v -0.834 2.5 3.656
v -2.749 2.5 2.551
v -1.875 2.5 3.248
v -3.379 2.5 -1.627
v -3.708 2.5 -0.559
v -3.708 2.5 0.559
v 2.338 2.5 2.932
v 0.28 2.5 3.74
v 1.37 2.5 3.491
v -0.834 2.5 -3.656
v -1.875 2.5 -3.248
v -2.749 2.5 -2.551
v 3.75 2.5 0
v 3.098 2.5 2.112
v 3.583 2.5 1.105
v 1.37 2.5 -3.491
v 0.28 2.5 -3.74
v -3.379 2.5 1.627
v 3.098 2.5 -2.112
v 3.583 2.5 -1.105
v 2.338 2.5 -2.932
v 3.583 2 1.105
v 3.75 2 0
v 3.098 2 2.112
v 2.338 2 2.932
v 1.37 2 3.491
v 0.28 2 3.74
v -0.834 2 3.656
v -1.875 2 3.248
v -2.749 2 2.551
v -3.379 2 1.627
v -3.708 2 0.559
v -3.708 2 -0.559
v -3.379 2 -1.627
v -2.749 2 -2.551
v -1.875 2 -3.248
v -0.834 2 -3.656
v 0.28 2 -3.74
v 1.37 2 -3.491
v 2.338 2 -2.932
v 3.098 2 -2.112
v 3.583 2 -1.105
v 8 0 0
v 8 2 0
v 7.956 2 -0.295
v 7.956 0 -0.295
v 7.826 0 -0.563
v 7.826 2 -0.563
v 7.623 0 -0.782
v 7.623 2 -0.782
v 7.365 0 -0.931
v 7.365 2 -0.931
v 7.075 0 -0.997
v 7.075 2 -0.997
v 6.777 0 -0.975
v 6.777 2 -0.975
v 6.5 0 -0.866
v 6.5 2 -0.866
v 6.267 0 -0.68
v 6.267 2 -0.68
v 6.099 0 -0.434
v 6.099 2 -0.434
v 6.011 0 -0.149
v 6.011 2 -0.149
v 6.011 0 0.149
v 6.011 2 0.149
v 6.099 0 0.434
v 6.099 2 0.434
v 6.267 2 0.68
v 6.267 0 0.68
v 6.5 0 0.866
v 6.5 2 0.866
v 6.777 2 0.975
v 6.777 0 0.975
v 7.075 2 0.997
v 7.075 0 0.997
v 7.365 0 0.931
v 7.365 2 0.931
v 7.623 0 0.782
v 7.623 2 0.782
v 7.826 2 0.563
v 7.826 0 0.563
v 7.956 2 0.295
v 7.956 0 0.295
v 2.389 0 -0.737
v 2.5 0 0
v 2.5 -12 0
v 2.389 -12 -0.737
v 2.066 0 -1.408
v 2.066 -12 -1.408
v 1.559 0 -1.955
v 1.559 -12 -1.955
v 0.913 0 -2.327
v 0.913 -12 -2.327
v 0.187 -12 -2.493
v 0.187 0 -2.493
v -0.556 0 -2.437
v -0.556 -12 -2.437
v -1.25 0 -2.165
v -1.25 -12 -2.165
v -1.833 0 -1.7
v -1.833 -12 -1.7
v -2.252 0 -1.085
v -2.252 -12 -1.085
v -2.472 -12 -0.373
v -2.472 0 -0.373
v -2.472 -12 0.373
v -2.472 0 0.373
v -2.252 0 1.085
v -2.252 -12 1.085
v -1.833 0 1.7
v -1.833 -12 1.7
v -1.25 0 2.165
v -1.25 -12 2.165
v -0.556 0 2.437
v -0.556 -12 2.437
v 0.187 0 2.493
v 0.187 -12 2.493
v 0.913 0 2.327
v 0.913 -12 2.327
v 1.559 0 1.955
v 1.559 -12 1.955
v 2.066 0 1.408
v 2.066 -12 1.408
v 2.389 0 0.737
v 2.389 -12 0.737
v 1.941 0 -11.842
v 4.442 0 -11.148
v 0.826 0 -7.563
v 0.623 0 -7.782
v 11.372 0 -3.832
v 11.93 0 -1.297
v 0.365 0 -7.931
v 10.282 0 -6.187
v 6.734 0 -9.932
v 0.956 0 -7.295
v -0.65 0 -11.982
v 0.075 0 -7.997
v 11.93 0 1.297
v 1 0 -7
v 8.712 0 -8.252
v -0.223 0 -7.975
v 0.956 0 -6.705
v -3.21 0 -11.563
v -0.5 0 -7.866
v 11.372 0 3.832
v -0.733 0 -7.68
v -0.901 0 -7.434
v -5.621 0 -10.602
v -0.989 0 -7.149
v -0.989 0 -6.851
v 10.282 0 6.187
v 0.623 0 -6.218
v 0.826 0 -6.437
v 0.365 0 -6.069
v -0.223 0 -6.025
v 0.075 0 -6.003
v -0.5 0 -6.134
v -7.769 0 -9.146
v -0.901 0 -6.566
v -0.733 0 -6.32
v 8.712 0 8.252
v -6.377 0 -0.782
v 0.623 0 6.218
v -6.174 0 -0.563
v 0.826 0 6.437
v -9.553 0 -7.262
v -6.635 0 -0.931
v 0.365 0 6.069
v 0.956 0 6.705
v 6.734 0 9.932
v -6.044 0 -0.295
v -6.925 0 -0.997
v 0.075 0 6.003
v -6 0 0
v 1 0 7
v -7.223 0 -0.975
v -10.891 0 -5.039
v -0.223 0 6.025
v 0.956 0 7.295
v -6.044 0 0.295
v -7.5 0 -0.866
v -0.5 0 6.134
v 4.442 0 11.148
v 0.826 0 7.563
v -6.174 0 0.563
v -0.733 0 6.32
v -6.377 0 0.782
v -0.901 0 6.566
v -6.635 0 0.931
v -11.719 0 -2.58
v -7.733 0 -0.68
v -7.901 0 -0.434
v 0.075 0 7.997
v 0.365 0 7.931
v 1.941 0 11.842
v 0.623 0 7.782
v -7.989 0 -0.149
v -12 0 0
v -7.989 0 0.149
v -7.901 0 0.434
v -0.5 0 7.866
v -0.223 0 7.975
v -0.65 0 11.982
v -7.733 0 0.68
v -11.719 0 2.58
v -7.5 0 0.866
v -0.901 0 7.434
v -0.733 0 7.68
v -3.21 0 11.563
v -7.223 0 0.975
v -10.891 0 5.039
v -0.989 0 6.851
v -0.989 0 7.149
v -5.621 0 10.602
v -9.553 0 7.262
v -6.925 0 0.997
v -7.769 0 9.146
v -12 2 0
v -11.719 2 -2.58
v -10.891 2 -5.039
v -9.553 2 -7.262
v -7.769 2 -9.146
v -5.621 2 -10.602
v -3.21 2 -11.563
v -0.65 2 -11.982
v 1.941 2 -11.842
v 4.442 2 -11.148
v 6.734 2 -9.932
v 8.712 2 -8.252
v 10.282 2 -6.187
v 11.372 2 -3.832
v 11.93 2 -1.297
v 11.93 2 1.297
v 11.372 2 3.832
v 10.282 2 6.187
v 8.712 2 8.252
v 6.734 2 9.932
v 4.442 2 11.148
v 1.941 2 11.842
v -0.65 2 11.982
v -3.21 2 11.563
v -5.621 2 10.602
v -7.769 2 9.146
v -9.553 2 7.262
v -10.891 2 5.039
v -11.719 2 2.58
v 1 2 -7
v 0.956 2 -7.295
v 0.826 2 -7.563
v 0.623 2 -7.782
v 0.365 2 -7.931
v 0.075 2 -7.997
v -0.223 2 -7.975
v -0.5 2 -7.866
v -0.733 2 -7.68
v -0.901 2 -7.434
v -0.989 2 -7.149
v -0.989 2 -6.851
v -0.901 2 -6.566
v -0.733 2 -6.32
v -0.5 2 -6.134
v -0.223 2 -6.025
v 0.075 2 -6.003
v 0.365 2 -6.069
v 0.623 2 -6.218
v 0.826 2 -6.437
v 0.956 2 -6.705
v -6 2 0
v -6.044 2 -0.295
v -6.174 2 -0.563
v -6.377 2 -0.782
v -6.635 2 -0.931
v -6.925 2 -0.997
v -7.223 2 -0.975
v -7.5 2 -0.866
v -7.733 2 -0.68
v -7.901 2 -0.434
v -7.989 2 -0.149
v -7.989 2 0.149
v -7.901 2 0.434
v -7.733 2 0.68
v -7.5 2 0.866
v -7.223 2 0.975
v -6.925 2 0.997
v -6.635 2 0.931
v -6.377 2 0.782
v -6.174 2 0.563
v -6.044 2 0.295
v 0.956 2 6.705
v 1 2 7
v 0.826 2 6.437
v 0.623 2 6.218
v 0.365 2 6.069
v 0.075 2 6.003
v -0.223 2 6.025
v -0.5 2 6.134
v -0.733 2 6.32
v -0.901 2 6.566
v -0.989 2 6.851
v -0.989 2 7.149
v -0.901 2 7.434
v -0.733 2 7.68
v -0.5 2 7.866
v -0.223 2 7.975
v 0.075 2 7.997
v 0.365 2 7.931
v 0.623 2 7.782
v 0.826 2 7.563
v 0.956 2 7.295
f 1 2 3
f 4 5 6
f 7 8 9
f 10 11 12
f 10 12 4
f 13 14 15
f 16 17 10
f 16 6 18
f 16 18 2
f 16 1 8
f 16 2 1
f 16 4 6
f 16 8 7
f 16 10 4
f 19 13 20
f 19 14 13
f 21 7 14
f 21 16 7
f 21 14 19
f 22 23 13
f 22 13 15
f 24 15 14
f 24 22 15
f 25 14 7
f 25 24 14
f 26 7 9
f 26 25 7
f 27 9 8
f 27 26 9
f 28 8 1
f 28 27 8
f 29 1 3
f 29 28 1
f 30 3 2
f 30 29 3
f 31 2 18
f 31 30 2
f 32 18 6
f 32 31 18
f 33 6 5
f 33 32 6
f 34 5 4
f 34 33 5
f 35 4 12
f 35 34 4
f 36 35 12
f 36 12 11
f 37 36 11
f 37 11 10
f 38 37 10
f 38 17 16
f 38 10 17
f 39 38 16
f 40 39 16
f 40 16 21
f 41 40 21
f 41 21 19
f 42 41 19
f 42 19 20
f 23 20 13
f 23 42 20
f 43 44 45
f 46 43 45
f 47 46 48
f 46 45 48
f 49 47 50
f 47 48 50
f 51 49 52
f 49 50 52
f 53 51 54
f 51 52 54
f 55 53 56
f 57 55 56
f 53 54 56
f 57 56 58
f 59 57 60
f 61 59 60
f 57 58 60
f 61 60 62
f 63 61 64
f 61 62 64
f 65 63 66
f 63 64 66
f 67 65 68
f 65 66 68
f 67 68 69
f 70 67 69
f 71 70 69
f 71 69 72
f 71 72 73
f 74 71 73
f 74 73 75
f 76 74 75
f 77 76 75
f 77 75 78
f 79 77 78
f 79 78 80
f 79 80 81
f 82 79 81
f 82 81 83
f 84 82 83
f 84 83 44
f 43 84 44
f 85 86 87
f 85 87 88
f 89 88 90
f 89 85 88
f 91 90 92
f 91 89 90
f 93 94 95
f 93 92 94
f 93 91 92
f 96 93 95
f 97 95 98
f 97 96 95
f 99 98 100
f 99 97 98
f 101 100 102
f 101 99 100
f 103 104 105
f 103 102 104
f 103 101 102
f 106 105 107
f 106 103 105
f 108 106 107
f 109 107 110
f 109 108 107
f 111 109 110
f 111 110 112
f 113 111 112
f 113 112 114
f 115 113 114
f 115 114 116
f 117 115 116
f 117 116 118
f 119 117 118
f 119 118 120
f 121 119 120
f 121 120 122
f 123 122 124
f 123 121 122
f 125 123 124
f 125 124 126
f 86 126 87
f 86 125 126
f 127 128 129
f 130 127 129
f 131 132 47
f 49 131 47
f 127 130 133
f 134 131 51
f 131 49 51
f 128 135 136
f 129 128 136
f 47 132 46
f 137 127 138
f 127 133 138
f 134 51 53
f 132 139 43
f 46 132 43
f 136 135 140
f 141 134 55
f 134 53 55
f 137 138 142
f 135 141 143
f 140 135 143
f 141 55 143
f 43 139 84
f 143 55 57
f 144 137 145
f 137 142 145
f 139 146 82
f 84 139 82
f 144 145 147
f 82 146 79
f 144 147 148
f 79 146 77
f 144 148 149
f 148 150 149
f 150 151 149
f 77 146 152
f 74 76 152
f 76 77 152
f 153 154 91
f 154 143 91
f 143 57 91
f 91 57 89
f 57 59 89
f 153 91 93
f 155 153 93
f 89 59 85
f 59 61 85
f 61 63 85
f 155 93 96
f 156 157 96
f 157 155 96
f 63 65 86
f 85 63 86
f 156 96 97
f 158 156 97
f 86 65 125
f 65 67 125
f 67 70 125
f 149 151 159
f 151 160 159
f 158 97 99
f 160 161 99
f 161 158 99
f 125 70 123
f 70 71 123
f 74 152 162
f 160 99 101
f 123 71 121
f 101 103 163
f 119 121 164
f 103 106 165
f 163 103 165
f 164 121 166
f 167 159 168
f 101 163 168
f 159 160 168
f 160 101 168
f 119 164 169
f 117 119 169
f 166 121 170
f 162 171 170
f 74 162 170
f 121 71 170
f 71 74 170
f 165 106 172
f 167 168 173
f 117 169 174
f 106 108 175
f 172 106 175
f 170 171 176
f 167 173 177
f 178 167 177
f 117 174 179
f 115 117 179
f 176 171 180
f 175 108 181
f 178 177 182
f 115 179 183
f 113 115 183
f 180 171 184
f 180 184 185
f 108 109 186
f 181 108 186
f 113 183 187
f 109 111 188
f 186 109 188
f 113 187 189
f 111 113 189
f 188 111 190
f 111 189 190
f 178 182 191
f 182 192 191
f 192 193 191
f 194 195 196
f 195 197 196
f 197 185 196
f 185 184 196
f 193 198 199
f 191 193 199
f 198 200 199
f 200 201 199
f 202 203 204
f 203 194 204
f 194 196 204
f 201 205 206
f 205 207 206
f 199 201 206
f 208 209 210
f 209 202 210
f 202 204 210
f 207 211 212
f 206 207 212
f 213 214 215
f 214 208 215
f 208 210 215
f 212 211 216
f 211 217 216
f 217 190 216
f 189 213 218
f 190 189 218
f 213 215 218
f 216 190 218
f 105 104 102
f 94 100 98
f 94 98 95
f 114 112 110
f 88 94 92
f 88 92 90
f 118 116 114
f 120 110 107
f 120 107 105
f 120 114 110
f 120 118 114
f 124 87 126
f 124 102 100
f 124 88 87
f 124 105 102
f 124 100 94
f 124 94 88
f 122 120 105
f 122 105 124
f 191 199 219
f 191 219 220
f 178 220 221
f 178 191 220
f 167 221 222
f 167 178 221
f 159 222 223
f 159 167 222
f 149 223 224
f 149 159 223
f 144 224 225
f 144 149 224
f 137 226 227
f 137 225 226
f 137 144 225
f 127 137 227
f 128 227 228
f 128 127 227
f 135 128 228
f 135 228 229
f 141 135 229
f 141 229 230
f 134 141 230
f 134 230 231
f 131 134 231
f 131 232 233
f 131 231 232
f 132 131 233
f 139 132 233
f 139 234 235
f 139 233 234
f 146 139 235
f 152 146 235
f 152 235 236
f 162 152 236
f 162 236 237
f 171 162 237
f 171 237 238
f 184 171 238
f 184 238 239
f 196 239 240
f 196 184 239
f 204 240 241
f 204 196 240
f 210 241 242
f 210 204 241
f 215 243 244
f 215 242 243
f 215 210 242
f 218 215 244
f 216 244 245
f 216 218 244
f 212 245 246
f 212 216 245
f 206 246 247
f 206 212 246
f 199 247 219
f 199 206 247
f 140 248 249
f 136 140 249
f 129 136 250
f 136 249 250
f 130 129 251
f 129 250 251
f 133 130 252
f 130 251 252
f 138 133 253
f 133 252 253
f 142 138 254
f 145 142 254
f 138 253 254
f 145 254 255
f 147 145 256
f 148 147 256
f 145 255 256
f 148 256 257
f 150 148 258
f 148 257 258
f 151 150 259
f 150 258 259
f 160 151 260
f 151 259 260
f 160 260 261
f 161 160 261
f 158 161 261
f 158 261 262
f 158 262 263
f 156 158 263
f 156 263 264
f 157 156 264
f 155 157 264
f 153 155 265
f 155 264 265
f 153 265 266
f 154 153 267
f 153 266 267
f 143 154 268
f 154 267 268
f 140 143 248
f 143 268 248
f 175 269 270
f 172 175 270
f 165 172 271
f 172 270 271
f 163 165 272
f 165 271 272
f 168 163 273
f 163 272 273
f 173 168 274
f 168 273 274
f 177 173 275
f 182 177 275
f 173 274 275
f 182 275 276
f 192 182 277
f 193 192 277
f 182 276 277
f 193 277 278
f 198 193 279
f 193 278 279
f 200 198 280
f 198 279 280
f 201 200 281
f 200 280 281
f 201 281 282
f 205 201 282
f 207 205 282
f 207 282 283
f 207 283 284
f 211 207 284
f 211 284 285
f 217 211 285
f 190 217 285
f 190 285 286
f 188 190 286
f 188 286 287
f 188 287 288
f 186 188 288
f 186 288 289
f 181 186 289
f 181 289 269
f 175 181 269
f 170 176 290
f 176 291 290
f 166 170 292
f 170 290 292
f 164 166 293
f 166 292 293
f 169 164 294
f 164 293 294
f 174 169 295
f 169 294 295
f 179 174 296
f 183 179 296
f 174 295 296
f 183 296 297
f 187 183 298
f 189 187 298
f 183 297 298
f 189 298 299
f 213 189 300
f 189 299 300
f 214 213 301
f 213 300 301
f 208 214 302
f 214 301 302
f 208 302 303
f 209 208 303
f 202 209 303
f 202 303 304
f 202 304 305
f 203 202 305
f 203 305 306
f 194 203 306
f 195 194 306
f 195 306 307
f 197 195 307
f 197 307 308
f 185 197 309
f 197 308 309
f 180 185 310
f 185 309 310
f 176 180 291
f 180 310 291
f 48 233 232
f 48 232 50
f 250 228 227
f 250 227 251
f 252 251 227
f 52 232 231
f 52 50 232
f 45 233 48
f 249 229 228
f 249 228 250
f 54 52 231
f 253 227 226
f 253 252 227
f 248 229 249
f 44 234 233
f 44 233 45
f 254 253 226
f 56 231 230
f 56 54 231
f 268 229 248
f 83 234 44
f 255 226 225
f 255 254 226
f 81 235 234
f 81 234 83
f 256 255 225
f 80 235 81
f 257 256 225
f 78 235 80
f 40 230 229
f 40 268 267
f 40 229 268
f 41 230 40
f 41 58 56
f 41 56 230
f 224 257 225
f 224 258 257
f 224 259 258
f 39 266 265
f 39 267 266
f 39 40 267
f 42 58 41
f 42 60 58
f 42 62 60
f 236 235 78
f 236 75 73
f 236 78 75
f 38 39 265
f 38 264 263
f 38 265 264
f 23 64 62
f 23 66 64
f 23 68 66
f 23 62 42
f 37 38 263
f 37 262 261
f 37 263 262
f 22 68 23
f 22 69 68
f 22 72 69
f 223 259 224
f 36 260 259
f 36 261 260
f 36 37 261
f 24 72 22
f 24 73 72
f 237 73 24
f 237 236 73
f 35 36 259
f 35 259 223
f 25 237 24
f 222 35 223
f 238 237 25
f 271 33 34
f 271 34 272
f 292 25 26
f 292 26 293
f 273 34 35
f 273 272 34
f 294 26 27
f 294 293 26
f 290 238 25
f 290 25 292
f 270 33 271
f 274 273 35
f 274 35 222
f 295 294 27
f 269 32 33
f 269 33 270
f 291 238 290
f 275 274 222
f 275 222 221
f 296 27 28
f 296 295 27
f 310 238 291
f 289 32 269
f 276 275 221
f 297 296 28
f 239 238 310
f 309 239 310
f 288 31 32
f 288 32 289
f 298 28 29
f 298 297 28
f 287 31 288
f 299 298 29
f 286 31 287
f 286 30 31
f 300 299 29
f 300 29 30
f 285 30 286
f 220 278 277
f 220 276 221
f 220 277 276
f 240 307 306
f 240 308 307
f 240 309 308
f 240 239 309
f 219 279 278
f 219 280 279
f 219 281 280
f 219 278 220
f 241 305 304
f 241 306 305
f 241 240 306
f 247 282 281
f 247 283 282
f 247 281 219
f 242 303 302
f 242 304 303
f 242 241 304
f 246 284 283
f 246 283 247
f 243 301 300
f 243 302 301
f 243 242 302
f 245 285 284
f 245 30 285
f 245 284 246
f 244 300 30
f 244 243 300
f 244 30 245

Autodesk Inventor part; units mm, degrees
ref_plane "YZ Plane" through (0, 0, 0) normal (1, 0, 0) x (0, 1, 0)
ref_plane "XZ Plane" through (0, 0, 0) normal (0, 1, 0) x (-1, 0, 0)
ref_plane "XY Plane" through (0, 0, 0) normal (0, 0, 1) x (1, 0, 0)
sketch "Sketch1" plane through (0, 0, 0) normal (0, 1, 0) x (-1, 0, 0)
  circle A0 centre (0, 0) radius 12
  dimension "sa_diameter" = 24
extrude "Extrusion1" add sketch "Sketch1" along normal blind 2
sketch "Sketch2" plane through (0, 0, 0) normal (0, -1, 0) x (1, 0, 0)
  circle A0 centre (0, 0) radius 2.5
  dimension "d4" = 5
extrude "Extrusion2" add sketch "Sketch2" along normal blind 12
sketch "Sketch4" plane through (0, 2, 0) normal (0, 1, 0) x (1, 0, 0)
  circle A0 centre (0, 0) radius 3.75
  dimension "d12" = 7.5
extrude "Extrusion4" add sketch "Sketch4" along normal blind 0.5
sketch "Sketch5" plane through (0, 2, 0) normal (0, 1, 0) x (1, 0, 0)
  circle A0 centre (0, 7) radius 1
  circle A1 centre (0, -7) radius 1
  circle A2 centre (-7, 0) radius 1
  circle A3 centre (7, 0) radius 1
  point P0 (0, 0)
  dimension "sa_hole_distance" = 7
  dimension "d16" = 7
  dimension "sa_hole_diameter" = 2
  dimension "d20" = 7
  dimension "d21" = 7
extrude "Extrusion5" cut sketch "Sketch5" against normal through all
equation "\"sa_diameter\" = servo_arm_diameter"
equation "\"sa_thickness\" = servo_arm_thickness"
equation "\"sa_hole_distance\" = servo_arm_hole_distance"
equation "\"d16\" = sa_hole_distance"
equation "\"sa_hole_diameter\" = servo_arm_hole_diameter"
equation "\"d20\" = sa_hole_distance"
equation "\"d21\" = sa_hole_distance"
equation "\"servo_arm_thickness\" = 2"
equation "\"servo_arm_diameter\" = 24"
equation "\"servo_arm_hole_diameter\" = 2"
equation "\"servo_arm_hole_distance\" = 7"
properties part number "Servo_arm" material "ABS Plastic"
